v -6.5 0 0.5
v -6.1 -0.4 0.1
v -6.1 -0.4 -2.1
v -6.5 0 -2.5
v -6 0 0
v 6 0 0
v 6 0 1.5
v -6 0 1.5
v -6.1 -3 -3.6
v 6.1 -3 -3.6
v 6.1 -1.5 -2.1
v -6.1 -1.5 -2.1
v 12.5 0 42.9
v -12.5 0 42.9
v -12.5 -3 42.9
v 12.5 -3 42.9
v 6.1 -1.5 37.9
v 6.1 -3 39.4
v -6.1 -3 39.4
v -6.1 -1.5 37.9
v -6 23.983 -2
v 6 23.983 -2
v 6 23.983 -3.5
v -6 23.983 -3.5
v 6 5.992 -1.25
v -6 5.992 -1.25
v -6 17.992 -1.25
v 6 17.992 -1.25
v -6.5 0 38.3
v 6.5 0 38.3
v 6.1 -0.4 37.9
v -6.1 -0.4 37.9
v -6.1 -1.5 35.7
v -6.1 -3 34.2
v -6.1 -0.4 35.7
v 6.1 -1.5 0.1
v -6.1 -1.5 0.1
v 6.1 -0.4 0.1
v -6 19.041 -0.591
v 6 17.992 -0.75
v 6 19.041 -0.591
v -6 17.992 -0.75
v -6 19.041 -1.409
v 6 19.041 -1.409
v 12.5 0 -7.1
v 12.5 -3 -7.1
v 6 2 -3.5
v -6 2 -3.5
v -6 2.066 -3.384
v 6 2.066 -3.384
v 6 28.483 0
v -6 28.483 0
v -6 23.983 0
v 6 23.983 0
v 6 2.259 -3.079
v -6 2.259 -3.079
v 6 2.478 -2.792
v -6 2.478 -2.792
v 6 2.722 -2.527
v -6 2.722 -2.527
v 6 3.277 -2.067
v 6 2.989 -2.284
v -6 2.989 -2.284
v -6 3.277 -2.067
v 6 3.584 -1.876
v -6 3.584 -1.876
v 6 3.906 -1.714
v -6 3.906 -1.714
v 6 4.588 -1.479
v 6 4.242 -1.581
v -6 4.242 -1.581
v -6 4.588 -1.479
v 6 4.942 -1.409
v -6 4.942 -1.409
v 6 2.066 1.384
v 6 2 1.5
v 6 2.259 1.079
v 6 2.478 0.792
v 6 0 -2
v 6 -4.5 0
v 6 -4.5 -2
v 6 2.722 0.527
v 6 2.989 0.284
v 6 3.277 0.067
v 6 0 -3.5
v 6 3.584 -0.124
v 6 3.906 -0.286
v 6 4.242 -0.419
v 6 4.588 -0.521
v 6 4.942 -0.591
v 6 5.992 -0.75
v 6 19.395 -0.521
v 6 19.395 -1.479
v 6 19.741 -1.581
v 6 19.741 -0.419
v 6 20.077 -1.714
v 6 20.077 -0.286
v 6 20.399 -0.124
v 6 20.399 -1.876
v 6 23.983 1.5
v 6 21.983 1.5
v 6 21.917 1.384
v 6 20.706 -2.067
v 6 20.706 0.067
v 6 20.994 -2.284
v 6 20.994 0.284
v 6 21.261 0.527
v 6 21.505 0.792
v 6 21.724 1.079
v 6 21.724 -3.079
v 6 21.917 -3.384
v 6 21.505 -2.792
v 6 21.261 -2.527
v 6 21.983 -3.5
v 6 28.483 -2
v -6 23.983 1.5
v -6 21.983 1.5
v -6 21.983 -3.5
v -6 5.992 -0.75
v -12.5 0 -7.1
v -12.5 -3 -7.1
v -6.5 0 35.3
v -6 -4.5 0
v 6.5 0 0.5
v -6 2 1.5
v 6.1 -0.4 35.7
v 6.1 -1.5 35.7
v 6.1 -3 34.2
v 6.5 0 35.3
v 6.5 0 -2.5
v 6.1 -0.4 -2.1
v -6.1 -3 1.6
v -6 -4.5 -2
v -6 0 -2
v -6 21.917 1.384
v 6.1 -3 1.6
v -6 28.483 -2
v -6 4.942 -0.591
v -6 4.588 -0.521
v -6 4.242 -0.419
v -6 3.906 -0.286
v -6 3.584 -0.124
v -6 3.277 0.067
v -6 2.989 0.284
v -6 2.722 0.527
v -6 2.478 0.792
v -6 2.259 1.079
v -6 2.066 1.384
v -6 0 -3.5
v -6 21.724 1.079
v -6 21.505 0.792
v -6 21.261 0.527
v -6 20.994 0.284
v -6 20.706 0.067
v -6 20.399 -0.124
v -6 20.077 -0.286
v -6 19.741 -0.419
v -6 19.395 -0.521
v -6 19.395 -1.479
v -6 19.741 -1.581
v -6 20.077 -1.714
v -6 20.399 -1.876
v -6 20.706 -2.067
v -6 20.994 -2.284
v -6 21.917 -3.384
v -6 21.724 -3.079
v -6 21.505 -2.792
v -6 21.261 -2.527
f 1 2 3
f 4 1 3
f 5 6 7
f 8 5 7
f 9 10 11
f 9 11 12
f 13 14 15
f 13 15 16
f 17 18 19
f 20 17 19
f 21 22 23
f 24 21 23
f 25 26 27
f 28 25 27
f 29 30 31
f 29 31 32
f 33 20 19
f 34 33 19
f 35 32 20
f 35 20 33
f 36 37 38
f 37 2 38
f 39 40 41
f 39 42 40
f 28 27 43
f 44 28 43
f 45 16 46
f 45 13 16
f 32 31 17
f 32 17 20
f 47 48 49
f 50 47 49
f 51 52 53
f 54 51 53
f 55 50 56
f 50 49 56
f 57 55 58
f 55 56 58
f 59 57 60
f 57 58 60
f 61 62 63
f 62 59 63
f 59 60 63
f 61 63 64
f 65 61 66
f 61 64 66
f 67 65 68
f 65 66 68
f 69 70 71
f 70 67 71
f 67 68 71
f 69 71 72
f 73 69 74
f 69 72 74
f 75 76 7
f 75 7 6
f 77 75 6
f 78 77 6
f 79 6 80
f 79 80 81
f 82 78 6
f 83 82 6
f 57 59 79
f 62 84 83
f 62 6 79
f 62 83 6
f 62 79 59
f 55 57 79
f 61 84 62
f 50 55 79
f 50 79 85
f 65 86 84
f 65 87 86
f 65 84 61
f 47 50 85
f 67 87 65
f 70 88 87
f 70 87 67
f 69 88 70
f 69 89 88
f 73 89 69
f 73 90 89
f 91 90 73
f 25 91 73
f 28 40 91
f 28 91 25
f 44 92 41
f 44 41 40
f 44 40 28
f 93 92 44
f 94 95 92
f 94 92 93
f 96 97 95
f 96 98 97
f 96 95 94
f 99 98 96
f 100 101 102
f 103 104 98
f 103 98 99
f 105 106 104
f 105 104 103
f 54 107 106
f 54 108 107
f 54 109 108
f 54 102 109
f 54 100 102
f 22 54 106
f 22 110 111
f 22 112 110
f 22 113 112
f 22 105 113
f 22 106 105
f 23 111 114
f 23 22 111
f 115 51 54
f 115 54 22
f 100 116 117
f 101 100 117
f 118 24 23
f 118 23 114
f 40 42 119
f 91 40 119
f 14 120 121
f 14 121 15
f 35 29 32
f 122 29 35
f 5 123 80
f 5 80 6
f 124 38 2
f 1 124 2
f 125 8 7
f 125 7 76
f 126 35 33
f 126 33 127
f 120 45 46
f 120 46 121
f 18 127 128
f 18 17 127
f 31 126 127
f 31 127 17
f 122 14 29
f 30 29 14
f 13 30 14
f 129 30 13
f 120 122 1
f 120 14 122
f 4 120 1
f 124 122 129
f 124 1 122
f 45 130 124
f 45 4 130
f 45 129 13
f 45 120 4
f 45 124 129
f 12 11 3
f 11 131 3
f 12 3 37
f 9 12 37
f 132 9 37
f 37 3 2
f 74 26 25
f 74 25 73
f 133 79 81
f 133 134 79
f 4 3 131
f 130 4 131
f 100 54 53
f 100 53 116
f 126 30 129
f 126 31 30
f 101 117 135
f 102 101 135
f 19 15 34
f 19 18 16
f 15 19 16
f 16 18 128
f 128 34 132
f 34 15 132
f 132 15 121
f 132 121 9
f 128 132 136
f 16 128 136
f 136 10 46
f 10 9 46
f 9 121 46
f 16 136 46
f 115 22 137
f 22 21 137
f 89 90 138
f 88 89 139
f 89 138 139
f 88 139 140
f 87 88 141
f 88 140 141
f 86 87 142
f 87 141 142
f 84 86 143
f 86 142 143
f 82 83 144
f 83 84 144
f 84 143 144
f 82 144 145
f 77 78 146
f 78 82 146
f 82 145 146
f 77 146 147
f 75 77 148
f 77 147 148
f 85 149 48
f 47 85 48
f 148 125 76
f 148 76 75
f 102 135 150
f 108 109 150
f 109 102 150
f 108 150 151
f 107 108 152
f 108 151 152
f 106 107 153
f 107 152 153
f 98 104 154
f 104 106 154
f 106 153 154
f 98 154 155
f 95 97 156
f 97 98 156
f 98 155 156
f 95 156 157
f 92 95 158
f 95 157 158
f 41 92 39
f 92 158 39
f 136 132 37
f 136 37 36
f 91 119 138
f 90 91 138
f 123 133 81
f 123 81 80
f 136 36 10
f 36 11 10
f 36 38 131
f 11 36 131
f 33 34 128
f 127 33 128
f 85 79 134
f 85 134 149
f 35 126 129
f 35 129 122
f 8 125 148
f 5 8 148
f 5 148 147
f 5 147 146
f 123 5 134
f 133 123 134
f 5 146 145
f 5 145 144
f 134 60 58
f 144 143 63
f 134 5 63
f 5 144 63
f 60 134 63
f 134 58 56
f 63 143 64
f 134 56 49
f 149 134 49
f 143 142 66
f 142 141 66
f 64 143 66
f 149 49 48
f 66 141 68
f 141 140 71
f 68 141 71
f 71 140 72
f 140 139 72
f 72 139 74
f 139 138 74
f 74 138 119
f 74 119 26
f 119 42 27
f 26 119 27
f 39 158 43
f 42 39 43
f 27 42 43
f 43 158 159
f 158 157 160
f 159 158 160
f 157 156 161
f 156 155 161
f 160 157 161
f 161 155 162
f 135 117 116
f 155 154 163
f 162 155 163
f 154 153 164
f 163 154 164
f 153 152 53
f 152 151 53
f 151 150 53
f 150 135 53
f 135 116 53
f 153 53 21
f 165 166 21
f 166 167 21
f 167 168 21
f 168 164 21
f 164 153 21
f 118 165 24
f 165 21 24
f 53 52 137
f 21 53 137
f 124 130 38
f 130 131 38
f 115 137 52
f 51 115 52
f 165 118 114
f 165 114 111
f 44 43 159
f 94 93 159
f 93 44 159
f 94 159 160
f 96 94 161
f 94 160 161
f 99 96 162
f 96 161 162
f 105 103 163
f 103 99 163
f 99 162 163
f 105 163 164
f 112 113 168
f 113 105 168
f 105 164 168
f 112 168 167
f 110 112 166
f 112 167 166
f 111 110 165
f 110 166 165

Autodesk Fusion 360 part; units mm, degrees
sketch "Sketch1" plane through (0, 0, 0) normal (1, 0, 0) x (0, 0, -1)
  line L0 (0, 0) -> (2, 0)
  line L1 (2, 0) -> (2, -4.5)
  line L2 (2, -4.5) -> (0, -4.5)
  line L3 (0, -4.5) -> (0, 0)
  line L4 (2, 0) -> (3.5, 0)
  line L5 (1, 0) -> (1, 16.3106) construction
  line L6 (-3.4591, 11.9915) -> (5.8046, 11.9915) construction
  line L7 (1.25, 11.9915) -> (1.25, 5.9915)
  line L8 (1.25, 5.9915) -> (1.7, 3.0254)
  line L9 (3.5, 0) -> (3.5, 2)
  line L10 (3.5, 2) -> (1.7, 3.0254)
  line L11 (0, 0) -> (-1.5, 0)
  line L12 (-1.5, 0) -> (-1.5, 2)
  line L13 (-1.5, 2) -> (0.3, 3.0254)
  line L14 (0.75, 5.9915) -> (0.3, 3.0254)
  line L15 (0.75, 11.9915) -> (0.75, 5.9915)
  line L16 (2, 23.9829) -> (3.5, 23.9829)
  line L17 (0.75, 17.9915) -> (0.3, 20.9575)
  line L18 (1.25, 17.9915) -> (1.7, 20.9575)
  line L19 (0.75, 11.9915) -> (0.75, 17.9915)
  line L20 (3.5, 23.9829) -> (3.5, 21.9829)
  line L21 (1.25, 11.9915) -> (1.25, 17.9915)
  line L22 (2, 23.9829) -> (2, 28.4829)
  line L23 (-1.5, 21.9829) -> (0.3, 20.9575)
  line L24 (0, 28.4829) -> (0, 23.9829)
  line L25 (2, 28.4829) -> (0, 28.4829)
  line L26 (0, 23.9829) -> (-1.5, 23.9829)
  line L27 (-1.5, 23.9829) -> (-1.5, 21.9829)
  line L28 (0, 23.9829) -> (2, 23.9829)
  line L29 (3.5, 21.9829) -> (1.7, 20.9575)
  point P0 (0, 23.9829)
  point P1 (1, 23.9829)
  dimension "d1" = 2
  dimension "d2" = 4.5
  dimension "d3" = 1.5
  dimension "d6" = 6
  dimension "d7" = 3
  dimension "d8" = 0.25
  dimension "d9" = 0.7
  dimension "d10" = 2
  dimension "d24" = 1.0254
extrude "Extrude1" add sketch "Sketch1" along normal mid plane 12 makes body 1
sketch "Sketch2" plane through (0, 0, 0) normal (0, 1, 0) x (1, 0, 0)
  line L0 (-6, 0) -> (6, 0)
  line L1 (6, 0) -> (6, 2)
  line L2 (6, 2) -> (-6, 2)
  line L3 (-6, 2) -> (-6, 0)
  line L4 (6.1, 2.1) -> (-6.1, 2.1)
  line L5 (-6.1, 2.1) -> (-6.1, -0.1)
  line L6 (-6.1, -0.1) -> (6.1, -0.1)
  line L7 (6.1, -0.1) -> (6.1, 2.1)
  line L8 (0, 0) -> (0, -36.4952) construction
  line L9 (12.5, 7.1) -> (-12.5, 7.1)
  line L10 (-12.5, 7.1) -> (-12.5, -42.9)
  line L11 (-12.5, -42.9) -> (12.5, -42.9)
  line L12 (12.5, -42.9) -> (12.5, 7.1)
  line L13 (12.5, 7.1) -> (-12.5, -42.9) construction
  line L14 (-12.5, 7.1) -> (12.5, -42.9) construction
  line L15 (0, -17.9) -> (-15.1957, -17.9) construction
  line L16 (-6.1, -35.7) -> (6.1, -35.7)
  line L17 (6.1, -35.7) -> (6.1, -37.9)
  line L18 (6.1, -37.9) -> (-6.1, -37.9)
  line L19 (-6.1, -37.9) -> (-6.1, -35.7)
  point P0 (0, -17.9)
  dimension "d13" = 0.1
  dimension "d14" = 25
  dimension "d15" = 50
  dimension "d16" = 5
extrude "Extrude2" add sketch "Sketch2" against normal blind 3 separate body contours L9 L10 L11 L12 makes body 2
chamfer "Chamfer1" distance 1.5 angle 45 4 edges at (0, -3, -2.1) (0, -3, 0.1) (0, -3, 35.7) (0, -3, 37.9) on bodies 2
fillet "Fillet1" radius 4 4 edges at (0, 3.0254, -0.3) (0, 3.0254, -1.7) (0, 20.9575, -0.3) (0, 20.9575, -1.7) on bodies 1
chamfer "Chamfer2" distance 0.4 angle 45 8 edges at (0, 0, 37.9) (-6.1, 0, 36.8) (0, 0, 35.7) (6.1, 0, 36.8) (0, 0, 0.1) (0, 0, -2.1) (6.1, 0, -1) (-6.1, 0, -1) on bodies 2
